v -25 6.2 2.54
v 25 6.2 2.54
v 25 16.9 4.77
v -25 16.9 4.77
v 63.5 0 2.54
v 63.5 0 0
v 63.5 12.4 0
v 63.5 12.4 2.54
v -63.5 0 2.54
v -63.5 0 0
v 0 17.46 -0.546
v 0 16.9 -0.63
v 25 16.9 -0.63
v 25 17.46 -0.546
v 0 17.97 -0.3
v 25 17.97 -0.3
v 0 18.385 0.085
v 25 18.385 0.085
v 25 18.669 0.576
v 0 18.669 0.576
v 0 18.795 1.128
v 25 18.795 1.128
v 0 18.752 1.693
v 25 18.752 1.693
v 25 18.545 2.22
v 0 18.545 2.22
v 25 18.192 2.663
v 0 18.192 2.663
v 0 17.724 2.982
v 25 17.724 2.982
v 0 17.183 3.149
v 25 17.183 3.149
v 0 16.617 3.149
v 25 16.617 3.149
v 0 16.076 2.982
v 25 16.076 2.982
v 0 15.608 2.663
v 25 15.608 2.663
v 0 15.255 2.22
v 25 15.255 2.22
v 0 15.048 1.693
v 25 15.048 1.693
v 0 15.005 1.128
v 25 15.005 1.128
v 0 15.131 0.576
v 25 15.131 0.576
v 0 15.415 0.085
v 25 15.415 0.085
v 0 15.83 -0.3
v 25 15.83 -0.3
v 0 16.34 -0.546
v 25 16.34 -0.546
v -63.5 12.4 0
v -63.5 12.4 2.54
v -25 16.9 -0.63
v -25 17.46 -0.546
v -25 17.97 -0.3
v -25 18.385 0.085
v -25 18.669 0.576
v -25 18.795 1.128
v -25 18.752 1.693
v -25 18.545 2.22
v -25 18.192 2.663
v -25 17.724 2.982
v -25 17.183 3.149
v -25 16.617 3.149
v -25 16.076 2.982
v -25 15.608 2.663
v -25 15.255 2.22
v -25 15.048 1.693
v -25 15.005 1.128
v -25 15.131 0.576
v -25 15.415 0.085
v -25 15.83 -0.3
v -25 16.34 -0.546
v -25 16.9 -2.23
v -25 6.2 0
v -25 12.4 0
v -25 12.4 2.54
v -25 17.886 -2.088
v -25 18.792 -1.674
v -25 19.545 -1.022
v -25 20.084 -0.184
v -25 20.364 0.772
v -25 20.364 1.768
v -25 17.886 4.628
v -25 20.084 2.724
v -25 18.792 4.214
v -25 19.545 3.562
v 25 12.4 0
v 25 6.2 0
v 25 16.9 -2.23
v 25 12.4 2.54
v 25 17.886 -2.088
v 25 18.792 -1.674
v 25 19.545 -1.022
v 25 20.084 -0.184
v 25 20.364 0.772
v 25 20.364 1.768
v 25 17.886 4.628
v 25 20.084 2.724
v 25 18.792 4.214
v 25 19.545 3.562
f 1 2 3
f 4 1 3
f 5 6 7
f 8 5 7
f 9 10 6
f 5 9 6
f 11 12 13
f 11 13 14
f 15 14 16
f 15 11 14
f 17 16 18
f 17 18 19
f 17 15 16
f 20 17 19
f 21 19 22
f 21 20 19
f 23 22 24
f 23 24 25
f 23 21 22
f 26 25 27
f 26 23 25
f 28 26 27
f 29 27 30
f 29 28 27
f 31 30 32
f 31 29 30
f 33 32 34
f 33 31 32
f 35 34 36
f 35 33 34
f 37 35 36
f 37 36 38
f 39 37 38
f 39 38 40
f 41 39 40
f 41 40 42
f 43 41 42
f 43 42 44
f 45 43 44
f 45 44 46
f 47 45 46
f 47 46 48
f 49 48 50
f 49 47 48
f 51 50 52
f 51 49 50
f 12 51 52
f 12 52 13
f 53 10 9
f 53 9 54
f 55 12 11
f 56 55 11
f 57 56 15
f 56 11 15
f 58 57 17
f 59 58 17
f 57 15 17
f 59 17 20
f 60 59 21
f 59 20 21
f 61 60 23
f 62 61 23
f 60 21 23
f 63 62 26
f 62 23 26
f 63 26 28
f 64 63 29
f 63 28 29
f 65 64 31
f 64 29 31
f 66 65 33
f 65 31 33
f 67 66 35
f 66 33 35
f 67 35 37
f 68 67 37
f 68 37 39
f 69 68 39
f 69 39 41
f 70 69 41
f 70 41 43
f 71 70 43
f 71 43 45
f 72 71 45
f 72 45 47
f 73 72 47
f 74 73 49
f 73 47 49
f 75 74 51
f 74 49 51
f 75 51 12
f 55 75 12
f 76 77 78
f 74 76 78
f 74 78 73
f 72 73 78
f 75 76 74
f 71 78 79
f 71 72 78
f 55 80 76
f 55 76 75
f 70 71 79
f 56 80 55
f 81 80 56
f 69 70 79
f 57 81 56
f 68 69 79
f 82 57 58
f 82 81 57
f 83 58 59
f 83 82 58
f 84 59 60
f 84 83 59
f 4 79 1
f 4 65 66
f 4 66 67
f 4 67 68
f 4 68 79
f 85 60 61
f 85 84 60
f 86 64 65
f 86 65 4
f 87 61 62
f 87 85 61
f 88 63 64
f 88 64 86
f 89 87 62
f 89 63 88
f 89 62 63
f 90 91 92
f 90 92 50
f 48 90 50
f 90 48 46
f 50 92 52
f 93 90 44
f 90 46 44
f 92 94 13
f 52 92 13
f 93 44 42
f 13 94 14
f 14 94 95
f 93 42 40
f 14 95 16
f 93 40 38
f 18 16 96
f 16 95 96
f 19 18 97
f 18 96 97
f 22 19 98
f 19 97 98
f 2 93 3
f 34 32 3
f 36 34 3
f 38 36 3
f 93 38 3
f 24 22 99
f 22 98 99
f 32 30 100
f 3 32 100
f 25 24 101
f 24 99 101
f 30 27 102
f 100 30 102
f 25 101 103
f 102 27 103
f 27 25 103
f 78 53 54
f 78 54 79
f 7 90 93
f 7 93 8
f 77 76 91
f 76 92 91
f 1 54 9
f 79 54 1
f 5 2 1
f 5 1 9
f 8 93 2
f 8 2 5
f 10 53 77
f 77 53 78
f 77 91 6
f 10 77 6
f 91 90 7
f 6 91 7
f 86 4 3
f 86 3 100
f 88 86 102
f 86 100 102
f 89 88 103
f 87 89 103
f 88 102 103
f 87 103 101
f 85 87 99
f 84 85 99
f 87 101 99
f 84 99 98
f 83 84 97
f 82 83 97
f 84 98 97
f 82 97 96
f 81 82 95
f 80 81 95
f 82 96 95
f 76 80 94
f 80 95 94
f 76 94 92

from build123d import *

# Parameters (mm, degrees)
SKETCH1_W           = 127
SKETCH1_H           = 12.4
BOSS_EXTRUDE1_DEPTH = 2.54
SKETCH2_R           = 1.9
BOSS_EXTRUDE3_DEPTH = 25
BOSS_EXTRUDE4_START = -25
SKETCH2_2_R         = 1.9
BOSS_EXTRUDE4_DEPTH = 25


with BuildPart() as part:
    # Sketch1 → Boss-Extrude1 (new body)
    with BuildSketch(Plane.XY):
        with Locations((0, 6.2)):
            Rectangle(SKETCH1_W, SKETCH1_H)
    extrude(amount=BOSS_EXTRUDE1_DEPTH)

    # Sketch2 → Boss-Extrude3 (add)
    with BuildSketch(Plane(origin=(0, 0, 0), x_dir=(0, 0, -1), z_dir=(1, 0, 0))):
        with BuildLine():
            Line((-2.54, 6.2), (-4.77, 16.9))
            ThreePointArc((-4.77, 16.9), (-1.27, 20.4), (2.23, 16.9))
            Line((2.23, 16.9), (0, 6.2))
            Line((0, 6.2), (-2.54, 6.2))
        make_face()
        with Locations((-1.27, 16.9)):
            Circle(SKETCH2_R, mode=Mode.SUBTRACT)
    extrude(amount=BOSS_EXTRUDE3_DEPTH)

    # Sketch2<2> → Boss-Extrude4 (add)
    with BuildSketch(Plane(origin=(0, 0, 0), x_dir=(0, 0, -1), z_dir=(1, 0, 0)).offset(BOSS_EXTRUDE4_START)):
        with BuildLine():
            Line((-2.54, 6.2), (-4.77, 16.9))
            ThreePointArc((-4.77, 16.9), (-1.27, 20.4), (2.23, 16.9))
            Line((2.23, 16.9), (0, 6.2))
            Line((0, 6.2), (-2.54, 6.2))
        make_face()
        with Locations((-1.27, 16.9)):
            Circle(SKETCH2_2_R, mode=Mode.SUBTRACT)
    extrude(amount=BOSS_EXTRUDE4_DEPTH)


solid = part.part
